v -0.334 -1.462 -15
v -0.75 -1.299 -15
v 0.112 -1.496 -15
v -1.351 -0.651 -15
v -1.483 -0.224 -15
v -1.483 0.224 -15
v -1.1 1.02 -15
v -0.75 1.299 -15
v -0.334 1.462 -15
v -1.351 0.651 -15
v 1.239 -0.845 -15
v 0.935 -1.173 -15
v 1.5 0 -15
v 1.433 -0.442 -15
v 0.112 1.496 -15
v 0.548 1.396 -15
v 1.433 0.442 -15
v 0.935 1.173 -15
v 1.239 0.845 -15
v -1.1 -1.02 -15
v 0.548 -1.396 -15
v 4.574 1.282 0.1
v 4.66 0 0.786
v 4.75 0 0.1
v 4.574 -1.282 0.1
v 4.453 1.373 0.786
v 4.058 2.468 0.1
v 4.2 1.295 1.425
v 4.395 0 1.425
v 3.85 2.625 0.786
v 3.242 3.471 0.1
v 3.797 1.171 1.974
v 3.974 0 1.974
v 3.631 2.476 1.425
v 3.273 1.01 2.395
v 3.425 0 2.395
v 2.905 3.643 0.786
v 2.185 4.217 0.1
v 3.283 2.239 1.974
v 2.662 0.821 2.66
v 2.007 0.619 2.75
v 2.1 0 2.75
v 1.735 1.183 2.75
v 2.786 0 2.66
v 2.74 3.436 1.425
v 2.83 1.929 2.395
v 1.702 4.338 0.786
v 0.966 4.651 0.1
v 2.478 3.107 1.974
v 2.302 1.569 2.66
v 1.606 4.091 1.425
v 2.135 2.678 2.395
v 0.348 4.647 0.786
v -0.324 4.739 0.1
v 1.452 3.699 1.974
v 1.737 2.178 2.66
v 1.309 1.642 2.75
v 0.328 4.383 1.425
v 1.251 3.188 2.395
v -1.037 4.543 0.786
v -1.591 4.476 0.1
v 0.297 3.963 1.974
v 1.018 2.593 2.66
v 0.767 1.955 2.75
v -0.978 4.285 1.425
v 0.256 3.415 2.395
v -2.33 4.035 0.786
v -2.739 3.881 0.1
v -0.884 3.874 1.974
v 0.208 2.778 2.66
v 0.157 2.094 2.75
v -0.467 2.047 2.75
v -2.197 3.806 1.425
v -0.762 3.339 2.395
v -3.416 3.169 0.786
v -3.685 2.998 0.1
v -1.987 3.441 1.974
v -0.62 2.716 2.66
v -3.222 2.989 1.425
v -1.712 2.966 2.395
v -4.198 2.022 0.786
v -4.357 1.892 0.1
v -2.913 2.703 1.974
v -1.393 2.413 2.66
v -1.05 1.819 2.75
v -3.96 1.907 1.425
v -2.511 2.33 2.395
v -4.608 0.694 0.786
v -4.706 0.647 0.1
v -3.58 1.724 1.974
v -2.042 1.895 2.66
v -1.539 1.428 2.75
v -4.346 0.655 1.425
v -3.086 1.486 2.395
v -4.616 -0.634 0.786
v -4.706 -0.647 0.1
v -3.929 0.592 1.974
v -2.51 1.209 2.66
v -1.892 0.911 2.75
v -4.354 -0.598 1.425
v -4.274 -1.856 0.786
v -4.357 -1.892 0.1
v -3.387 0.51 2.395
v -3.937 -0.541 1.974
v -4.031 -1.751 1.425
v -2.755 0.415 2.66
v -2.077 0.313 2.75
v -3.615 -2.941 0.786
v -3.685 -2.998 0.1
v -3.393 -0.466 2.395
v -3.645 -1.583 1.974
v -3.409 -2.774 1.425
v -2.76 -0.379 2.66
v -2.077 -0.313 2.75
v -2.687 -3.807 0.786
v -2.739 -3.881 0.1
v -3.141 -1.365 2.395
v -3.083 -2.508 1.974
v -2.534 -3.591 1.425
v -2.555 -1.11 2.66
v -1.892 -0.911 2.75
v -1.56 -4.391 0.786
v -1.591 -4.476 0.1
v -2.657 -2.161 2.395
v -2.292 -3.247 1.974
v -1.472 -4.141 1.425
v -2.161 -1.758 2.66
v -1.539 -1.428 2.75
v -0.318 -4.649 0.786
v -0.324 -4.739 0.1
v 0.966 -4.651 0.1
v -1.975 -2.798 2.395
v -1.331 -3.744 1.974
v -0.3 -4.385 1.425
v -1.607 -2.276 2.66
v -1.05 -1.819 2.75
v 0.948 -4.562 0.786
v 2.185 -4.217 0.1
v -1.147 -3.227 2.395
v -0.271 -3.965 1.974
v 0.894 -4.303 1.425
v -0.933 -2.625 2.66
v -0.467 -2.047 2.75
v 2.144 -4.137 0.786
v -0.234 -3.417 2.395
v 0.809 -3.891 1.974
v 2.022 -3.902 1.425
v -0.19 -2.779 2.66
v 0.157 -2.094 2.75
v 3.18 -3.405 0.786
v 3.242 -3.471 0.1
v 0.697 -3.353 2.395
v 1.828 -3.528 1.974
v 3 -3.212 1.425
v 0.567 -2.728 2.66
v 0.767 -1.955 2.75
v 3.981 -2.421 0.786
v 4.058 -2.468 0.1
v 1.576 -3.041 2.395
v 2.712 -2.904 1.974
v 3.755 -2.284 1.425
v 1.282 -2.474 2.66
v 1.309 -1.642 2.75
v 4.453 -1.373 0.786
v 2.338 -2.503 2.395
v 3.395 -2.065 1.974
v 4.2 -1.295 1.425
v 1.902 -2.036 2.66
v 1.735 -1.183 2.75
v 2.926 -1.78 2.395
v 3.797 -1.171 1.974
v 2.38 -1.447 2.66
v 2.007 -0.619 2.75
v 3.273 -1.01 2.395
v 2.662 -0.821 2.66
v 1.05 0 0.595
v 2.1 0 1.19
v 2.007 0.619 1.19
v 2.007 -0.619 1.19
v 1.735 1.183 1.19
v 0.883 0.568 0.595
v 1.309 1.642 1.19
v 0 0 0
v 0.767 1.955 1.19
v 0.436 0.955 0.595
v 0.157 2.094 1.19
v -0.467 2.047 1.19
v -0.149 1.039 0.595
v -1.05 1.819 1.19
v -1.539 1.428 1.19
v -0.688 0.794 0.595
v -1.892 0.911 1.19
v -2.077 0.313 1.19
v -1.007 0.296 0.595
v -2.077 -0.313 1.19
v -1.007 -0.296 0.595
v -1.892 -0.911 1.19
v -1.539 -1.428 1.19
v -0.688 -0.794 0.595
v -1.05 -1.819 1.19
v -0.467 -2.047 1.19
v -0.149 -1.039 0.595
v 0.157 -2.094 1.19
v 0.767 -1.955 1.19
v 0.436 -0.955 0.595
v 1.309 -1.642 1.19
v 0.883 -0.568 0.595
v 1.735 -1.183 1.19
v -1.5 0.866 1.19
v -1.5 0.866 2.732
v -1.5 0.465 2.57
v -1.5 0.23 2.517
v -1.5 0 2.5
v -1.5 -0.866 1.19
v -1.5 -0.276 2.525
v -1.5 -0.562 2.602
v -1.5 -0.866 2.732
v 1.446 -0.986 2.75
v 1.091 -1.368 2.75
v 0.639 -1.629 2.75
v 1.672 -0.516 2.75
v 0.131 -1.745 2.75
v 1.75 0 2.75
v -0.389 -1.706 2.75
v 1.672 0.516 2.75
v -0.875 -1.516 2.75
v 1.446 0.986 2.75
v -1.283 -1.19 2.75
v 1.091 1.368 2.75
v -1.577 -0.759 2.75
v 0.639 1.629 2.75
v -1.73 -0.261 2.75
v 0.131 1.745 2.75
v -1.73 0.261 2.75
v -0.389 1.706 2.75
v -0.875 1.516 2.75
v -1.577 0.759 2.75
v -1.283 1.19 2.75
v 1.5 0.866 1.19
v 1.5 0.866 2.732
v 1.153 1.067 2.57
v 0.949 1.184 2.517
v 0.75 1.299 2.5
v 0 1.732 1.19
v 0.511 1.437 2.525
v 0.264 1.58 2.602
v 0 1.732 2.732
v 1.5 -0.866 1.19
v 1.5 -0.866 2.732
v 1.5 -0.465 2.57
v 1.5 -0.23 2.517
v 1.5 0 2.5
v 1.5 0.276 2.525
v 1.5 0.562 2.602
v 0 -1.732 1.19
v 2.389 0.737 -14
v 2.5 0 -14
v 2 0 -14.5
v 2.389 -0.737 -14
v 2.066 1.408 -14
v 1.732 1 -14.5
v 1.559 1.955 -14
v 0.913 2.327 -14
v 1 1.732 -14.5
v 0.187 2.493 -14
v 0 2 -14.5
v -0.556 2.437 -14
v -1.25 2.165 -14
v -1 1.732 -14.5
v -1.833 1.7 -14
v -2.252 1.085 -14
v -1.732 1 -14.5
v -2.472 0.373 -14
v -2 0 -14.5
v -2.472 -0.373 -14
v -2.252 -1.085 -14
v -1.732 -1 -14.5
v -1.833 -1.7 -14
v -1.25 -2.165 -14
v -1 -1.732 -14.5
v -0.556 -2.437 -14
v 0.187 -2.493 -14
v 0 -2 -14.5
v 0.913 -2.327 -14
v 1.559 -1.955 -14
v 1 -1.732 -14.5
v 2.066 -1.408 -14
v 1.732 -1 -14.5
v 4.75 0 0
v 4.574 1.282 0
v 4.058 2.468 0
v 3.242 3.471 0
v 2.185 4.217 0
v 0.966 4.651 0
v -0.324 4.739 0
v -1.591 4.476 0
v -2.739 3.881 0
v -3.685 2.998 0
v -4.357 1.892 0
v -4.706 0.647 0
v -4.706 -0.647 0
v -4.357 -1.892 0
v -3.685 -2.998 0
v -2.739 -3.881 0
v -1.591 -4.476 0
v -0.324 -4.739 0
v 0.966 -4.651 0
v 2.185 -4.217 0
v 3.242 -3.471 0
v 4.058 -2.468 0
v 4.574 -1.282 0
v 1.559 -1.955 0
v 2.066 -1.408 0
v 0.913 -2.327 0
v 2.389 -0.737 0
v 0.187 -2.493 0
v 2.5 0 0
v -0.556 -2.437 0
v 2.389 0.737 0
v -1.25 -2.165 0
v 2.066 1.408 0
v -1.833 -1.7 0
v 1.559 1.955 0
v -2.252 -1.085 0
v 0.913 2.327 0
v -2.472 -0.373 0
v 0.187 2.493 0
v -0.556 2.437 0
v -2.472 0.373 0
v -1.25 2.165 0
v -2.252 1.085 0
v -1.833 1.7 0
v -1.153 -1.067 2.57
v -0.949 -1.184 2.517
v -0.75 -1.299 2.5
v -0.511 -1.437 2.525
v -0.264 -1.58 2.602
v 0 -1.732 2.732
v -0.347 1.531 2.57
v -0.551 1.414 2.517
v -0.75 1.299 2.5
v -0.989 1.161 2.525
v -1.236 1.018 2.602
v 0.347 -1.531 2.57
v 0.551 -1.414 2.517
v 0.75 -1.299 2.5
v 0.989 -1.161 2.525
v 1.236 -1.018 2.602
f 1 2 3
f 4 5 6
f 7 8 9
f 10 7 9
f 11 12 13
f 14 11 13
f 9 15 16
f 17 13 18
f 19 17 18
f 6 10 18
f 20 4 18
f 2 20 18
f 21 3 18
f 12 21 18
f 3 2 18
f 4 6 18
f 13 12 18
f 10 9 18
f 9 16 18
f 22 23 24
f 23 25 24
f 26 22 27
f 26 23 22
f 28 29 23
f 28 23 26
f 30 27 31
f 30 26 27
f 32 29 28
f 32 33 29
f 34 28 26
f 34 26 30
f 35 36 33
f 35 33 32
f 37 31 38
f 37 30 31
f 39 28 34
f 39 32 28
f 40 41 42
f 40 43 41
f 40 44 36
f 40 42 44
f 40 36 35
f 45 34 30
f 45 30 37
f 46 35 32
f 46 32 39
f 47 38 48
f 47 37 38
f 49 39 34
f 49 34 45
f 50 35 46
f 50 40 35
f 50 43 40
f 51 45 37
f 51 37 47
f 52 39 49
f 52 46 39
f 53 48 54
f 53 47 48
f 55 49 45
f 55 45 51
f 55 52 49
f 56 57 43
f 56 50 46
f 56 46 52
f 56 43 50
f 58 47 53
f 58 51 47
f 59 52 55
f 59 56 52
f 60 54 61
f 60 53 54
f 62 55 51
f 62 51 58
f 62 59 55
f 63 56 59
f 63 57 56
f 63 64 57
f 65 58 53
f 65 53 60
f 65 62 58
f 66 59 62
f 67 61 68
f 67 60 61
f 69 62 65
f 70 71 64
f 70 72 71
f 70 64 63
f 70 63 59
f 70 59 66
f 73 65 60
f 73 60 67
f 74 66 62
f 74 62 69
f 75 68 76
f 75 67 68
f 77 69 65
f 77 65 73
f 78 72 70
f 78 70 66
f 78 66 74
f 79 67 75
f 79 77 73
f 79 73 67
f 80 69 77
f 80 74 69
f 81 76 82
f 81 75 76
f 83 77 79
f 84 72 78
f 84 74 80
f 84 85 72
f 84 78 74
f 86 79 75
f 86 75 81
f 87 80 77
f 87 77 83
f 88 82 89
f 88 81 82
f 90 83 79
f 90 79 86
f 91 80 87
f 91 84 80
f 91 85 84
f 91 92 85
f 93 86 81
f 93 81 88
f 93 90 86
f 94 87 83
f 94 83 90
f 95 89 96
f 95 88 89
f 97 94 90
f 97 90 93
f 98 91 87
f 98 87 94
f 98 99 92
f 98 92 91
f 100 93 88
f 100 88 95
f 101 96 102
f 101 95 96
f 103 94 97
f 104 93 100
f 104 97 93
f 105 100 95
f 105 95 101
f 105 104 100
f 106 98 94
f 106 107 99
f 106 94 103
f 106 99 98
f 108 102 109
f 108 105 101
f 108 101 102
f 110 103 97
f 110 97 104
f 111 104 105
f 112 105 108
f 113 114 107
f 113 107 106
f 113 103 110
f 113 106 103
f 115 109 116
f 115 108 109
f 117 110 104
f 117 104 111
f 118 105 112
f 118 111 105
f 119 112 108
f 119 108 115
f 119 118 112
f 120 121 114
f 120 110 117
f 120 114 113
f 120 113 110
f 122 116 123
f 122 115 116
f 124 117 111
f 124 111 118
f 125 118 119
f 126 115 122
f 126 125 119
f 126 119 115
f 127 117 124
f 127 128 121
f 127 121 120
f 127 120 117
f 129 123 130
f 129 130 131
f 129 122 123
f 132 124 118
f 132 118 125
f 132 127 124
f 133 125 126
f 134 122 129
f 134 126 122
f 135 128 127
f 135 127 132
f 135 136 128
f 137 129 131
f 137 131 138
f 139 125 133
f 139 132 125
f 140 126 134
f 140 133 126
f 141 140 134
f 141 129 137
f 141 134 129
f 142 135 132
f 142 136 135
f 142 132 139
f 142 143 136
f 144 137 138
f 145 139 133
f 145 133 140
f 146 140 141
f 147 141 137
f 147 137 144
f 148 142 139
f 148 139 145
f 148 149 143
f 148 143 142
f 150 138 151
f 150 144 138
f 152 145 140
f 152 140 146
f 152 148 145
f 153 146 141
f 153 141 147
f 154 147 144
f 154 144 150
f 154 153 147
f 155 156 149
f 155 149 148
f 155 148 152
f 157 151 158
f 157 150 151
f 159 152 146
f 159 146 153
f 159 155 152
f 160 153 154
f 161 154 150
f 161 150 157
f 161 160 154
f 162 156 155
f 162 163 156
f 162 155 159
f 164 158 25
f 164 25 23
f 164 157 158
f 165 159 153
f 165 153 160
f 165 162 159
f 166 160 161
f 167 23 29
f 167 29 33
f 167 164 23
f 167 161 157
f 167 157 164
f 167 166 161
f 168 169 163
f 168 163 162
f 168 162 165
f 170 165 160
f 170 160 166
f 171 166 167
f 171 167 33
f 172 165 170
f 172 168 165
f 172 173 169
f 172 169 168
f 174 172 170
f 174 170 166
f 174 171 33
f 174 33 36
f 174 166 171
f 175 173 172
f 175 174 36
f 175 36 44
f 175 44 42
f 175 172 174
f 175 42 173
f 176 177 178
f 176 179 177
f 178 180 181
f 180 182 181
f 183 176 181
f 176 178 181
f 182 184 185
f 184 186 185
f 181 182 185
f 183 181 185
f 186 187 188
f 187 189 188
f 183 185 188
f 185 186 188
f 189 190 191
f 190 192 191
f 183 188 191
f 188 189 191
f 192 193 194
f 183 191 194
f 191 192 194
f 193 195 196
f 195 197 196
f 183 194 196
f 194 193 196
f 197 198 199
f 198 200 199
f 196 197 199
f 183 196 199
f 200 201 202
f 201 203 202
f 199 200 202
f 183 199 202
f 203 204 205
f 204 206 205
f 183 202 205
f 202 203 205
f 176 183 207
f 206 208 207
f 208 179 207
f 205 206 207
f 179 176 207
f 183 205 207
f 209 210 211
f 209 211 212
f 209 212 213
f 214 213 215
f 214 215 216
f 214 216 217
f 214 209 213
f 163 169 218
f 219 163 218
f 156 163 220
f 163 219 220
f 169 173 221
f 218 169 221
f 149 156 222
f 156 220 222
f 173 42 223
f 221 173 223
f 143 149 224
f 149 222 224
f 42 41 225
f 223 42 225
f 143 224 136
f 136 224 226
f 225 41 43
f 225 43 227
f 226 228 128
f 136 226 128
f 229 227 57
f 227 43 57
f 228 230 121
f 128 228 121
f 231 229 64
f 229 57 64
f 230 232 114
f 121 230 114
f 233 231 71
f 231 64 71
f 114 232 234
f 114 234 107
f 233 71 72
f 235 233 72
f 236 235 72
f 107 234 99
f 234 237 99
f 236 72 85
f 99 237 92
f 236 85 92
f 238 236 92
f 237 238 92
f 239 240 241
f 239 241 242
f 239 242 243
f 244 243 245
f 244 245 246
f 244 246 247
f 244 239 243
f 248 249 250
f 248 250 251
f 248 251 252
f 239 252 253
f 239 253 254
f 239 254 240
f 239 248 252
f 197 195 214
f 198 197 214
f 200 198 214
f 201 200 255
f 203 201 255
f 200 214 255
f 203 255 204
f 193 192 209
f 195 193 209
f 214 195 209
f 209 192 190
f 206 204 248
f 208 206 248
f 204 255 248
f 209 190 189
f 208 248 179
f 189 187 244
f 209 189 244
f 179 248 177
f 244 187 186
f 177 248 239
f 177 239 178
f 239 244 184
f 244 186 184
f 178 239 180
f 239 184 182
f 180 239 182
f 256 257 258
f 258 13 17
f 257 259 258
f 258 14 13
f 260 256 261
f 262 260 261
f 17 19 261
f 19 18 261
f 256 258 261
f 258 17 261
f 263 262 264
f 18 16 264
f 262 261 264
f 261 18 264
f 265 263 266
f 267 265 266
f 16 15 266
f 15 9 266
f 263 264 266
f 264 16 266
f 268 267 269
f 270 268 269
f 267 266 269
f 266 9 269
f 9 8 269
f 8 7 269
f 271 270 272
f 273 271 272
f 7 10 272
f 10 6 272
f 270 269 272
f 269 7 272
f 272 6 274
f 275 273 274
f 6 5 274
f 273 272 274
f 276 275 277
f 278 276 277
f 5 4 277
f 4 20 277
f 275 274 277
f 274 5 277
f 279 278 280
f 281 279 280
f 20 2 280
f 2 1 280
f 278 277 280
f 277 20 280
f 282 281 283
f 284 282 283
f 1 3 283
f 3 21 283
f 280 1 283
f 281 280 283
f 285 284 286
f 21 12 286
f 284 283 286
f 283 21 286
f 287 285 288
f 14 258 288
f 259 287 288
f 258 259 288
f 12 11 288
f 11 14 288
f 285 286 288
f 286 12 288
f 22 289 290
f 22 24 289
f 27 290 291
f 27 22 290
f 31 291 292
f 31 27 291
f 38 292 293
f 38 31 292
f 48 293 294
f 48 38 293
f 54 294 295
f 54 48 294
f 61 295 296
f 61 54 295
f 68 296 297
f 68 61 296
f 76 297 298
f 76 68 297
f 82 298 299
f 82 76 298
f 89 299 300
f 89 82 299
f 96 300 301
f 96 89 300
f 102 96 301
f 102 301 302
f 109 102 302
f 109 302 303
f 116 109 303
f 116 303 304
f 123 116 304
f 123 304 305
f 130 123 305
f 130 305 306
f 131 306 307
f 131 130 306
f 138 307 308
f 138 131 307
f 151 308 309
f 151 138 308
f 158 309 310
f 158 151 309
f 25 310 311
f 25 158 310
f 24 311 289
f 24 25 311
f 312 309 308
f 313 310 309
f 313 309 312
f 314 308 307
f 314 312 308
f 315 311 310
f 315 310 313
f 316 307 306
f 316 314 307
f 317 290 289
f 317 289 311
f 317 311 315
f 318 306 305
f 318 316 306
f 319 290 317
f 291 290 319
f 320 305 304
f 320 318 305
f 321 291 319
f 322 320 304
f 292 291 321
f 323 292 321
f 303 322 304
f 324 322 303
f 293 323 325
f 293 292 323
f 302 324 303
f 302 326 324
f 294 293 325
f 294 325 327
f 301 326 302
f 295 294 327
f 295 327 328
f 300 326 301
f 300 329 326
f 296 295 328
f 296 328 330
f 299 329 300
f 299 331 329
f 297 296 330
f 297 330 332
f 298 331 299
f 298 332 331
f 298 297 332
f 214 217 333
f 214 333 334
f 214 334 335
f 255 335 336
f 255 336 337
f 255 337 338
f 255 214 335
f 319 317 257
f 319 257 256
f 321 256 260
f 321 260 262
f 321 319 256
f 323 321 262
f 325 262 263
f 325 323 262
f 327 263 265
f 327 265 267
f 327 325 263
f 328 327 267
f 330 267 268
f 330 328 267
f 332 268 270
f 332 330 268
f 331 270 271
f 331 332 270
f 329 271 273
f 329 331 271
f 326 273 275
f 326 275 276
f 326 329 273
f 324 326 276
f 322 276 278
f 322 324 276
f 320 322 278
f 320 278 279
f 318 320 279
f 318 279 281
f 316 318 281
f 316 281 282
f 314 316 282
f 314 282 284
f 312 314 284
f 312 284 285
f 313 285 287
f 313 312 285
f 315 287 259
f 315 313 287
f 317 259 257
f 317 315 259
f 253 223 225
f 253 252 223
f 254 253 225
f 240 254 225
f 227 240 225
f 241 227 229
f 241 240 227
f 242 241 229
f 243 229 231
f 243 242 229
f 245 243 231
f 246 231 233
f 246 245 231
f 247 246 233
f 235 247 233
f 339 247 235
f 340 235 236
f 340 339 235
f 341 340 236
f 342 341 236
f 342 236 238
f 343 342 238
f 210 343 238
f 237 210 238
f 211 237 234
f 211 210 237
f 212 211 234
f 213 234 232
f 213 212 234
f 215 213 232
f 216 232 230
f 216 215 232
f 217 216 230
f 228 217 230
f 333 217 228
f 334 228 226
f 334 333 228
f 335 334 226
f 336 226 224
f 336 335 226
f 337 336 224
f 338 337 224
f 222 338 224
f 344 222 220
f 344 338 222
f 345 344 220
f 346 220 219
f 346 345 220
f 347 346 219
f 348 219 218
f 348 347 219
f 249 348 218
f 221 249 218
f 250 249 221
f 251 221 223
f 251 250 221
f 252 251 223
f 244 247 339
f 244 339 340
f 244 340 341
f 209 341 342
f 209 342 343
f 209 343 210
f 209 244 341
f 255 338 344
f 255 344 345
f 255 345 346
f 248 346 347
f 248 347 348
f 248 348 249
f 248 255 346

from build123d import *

# Parameters (mm, degrees)
SKETCH002_R     = 2.5
PAD001_DEPTH    = 15
CHAMFER001_SIZE = 1
PAD_DEPTH       = 2
CHAMFER_SIZE    = 0.25


with BuildPart() as body002:
    # Sketch002 → Pad001 (new body)
    with BuildSketch(Plane.XY):
        Circle(SKETCH002_R)
    extrude(amount=-PAD001_DEPTH)

    # Chamfer001
    chamfer001_edges = [body002.edges().sort_by_distance(p)[0] for p in [
        (-2.5, 0, -15),
    ]]
    chamfer(chamfer001_edges, length=CHAMFER001_SIZE)


with BuildPart() as body001:
    # Sketch001 → Pad (new body)
    with BuildSketch(Plane.XY):
        Polygon((1.5, -0.8660254038), (1.5, 0.8660254038), (0, 1.7320508076), (-1.5, 0.8660254038), (-1.5, -0.8660254038), (0, -1.7320508076), align=None)
    extrude(amount=PAD_DEPTH)


with BuildPart() as fusion:
    # Sketch → Revolution (revolve)
    with BuildSketch(Plane.XZ):
        with BuildLine():
            Line((0, -1.19), (4.75, -1.19))
            Line((4.75, -1.19), (4.75, -1.09))
            ThreePointArc((4.75, -1.09), (3.9738329701, 0.7838329701), (2.1, 1.56))
            Line((1.5, 1.56), (2.1, 1.56))
            Line((1.5, 0), (1.5, 1.56))
            Line((2.1, 0), (1.5, 0))
            Line((0, -1.19), (2.1, 0))
        make_face()
    revolve(axis=Axis((0, 0, 0), (0, 0, 1)))

    # Chamfer
    chamfer_edges = [fusion.edges().sort_by_distance(p)[0] for p in [
        (-1.5, 0, 1.56),
    ]]
    chamfer(chamfer_edges, length=CHAMFER_SIZE)

    # Cut: cut Body001
    add(body001.part, mode=Mode.SUBTRACT)


with BuildPart() as fusion_1:
    # Cut placement: moved
    add(fusion.part.moved(Location((0, 0, 1.19))))

    # Fusion: union Body002
    add(body002.part)


solid = fusion_1.part
